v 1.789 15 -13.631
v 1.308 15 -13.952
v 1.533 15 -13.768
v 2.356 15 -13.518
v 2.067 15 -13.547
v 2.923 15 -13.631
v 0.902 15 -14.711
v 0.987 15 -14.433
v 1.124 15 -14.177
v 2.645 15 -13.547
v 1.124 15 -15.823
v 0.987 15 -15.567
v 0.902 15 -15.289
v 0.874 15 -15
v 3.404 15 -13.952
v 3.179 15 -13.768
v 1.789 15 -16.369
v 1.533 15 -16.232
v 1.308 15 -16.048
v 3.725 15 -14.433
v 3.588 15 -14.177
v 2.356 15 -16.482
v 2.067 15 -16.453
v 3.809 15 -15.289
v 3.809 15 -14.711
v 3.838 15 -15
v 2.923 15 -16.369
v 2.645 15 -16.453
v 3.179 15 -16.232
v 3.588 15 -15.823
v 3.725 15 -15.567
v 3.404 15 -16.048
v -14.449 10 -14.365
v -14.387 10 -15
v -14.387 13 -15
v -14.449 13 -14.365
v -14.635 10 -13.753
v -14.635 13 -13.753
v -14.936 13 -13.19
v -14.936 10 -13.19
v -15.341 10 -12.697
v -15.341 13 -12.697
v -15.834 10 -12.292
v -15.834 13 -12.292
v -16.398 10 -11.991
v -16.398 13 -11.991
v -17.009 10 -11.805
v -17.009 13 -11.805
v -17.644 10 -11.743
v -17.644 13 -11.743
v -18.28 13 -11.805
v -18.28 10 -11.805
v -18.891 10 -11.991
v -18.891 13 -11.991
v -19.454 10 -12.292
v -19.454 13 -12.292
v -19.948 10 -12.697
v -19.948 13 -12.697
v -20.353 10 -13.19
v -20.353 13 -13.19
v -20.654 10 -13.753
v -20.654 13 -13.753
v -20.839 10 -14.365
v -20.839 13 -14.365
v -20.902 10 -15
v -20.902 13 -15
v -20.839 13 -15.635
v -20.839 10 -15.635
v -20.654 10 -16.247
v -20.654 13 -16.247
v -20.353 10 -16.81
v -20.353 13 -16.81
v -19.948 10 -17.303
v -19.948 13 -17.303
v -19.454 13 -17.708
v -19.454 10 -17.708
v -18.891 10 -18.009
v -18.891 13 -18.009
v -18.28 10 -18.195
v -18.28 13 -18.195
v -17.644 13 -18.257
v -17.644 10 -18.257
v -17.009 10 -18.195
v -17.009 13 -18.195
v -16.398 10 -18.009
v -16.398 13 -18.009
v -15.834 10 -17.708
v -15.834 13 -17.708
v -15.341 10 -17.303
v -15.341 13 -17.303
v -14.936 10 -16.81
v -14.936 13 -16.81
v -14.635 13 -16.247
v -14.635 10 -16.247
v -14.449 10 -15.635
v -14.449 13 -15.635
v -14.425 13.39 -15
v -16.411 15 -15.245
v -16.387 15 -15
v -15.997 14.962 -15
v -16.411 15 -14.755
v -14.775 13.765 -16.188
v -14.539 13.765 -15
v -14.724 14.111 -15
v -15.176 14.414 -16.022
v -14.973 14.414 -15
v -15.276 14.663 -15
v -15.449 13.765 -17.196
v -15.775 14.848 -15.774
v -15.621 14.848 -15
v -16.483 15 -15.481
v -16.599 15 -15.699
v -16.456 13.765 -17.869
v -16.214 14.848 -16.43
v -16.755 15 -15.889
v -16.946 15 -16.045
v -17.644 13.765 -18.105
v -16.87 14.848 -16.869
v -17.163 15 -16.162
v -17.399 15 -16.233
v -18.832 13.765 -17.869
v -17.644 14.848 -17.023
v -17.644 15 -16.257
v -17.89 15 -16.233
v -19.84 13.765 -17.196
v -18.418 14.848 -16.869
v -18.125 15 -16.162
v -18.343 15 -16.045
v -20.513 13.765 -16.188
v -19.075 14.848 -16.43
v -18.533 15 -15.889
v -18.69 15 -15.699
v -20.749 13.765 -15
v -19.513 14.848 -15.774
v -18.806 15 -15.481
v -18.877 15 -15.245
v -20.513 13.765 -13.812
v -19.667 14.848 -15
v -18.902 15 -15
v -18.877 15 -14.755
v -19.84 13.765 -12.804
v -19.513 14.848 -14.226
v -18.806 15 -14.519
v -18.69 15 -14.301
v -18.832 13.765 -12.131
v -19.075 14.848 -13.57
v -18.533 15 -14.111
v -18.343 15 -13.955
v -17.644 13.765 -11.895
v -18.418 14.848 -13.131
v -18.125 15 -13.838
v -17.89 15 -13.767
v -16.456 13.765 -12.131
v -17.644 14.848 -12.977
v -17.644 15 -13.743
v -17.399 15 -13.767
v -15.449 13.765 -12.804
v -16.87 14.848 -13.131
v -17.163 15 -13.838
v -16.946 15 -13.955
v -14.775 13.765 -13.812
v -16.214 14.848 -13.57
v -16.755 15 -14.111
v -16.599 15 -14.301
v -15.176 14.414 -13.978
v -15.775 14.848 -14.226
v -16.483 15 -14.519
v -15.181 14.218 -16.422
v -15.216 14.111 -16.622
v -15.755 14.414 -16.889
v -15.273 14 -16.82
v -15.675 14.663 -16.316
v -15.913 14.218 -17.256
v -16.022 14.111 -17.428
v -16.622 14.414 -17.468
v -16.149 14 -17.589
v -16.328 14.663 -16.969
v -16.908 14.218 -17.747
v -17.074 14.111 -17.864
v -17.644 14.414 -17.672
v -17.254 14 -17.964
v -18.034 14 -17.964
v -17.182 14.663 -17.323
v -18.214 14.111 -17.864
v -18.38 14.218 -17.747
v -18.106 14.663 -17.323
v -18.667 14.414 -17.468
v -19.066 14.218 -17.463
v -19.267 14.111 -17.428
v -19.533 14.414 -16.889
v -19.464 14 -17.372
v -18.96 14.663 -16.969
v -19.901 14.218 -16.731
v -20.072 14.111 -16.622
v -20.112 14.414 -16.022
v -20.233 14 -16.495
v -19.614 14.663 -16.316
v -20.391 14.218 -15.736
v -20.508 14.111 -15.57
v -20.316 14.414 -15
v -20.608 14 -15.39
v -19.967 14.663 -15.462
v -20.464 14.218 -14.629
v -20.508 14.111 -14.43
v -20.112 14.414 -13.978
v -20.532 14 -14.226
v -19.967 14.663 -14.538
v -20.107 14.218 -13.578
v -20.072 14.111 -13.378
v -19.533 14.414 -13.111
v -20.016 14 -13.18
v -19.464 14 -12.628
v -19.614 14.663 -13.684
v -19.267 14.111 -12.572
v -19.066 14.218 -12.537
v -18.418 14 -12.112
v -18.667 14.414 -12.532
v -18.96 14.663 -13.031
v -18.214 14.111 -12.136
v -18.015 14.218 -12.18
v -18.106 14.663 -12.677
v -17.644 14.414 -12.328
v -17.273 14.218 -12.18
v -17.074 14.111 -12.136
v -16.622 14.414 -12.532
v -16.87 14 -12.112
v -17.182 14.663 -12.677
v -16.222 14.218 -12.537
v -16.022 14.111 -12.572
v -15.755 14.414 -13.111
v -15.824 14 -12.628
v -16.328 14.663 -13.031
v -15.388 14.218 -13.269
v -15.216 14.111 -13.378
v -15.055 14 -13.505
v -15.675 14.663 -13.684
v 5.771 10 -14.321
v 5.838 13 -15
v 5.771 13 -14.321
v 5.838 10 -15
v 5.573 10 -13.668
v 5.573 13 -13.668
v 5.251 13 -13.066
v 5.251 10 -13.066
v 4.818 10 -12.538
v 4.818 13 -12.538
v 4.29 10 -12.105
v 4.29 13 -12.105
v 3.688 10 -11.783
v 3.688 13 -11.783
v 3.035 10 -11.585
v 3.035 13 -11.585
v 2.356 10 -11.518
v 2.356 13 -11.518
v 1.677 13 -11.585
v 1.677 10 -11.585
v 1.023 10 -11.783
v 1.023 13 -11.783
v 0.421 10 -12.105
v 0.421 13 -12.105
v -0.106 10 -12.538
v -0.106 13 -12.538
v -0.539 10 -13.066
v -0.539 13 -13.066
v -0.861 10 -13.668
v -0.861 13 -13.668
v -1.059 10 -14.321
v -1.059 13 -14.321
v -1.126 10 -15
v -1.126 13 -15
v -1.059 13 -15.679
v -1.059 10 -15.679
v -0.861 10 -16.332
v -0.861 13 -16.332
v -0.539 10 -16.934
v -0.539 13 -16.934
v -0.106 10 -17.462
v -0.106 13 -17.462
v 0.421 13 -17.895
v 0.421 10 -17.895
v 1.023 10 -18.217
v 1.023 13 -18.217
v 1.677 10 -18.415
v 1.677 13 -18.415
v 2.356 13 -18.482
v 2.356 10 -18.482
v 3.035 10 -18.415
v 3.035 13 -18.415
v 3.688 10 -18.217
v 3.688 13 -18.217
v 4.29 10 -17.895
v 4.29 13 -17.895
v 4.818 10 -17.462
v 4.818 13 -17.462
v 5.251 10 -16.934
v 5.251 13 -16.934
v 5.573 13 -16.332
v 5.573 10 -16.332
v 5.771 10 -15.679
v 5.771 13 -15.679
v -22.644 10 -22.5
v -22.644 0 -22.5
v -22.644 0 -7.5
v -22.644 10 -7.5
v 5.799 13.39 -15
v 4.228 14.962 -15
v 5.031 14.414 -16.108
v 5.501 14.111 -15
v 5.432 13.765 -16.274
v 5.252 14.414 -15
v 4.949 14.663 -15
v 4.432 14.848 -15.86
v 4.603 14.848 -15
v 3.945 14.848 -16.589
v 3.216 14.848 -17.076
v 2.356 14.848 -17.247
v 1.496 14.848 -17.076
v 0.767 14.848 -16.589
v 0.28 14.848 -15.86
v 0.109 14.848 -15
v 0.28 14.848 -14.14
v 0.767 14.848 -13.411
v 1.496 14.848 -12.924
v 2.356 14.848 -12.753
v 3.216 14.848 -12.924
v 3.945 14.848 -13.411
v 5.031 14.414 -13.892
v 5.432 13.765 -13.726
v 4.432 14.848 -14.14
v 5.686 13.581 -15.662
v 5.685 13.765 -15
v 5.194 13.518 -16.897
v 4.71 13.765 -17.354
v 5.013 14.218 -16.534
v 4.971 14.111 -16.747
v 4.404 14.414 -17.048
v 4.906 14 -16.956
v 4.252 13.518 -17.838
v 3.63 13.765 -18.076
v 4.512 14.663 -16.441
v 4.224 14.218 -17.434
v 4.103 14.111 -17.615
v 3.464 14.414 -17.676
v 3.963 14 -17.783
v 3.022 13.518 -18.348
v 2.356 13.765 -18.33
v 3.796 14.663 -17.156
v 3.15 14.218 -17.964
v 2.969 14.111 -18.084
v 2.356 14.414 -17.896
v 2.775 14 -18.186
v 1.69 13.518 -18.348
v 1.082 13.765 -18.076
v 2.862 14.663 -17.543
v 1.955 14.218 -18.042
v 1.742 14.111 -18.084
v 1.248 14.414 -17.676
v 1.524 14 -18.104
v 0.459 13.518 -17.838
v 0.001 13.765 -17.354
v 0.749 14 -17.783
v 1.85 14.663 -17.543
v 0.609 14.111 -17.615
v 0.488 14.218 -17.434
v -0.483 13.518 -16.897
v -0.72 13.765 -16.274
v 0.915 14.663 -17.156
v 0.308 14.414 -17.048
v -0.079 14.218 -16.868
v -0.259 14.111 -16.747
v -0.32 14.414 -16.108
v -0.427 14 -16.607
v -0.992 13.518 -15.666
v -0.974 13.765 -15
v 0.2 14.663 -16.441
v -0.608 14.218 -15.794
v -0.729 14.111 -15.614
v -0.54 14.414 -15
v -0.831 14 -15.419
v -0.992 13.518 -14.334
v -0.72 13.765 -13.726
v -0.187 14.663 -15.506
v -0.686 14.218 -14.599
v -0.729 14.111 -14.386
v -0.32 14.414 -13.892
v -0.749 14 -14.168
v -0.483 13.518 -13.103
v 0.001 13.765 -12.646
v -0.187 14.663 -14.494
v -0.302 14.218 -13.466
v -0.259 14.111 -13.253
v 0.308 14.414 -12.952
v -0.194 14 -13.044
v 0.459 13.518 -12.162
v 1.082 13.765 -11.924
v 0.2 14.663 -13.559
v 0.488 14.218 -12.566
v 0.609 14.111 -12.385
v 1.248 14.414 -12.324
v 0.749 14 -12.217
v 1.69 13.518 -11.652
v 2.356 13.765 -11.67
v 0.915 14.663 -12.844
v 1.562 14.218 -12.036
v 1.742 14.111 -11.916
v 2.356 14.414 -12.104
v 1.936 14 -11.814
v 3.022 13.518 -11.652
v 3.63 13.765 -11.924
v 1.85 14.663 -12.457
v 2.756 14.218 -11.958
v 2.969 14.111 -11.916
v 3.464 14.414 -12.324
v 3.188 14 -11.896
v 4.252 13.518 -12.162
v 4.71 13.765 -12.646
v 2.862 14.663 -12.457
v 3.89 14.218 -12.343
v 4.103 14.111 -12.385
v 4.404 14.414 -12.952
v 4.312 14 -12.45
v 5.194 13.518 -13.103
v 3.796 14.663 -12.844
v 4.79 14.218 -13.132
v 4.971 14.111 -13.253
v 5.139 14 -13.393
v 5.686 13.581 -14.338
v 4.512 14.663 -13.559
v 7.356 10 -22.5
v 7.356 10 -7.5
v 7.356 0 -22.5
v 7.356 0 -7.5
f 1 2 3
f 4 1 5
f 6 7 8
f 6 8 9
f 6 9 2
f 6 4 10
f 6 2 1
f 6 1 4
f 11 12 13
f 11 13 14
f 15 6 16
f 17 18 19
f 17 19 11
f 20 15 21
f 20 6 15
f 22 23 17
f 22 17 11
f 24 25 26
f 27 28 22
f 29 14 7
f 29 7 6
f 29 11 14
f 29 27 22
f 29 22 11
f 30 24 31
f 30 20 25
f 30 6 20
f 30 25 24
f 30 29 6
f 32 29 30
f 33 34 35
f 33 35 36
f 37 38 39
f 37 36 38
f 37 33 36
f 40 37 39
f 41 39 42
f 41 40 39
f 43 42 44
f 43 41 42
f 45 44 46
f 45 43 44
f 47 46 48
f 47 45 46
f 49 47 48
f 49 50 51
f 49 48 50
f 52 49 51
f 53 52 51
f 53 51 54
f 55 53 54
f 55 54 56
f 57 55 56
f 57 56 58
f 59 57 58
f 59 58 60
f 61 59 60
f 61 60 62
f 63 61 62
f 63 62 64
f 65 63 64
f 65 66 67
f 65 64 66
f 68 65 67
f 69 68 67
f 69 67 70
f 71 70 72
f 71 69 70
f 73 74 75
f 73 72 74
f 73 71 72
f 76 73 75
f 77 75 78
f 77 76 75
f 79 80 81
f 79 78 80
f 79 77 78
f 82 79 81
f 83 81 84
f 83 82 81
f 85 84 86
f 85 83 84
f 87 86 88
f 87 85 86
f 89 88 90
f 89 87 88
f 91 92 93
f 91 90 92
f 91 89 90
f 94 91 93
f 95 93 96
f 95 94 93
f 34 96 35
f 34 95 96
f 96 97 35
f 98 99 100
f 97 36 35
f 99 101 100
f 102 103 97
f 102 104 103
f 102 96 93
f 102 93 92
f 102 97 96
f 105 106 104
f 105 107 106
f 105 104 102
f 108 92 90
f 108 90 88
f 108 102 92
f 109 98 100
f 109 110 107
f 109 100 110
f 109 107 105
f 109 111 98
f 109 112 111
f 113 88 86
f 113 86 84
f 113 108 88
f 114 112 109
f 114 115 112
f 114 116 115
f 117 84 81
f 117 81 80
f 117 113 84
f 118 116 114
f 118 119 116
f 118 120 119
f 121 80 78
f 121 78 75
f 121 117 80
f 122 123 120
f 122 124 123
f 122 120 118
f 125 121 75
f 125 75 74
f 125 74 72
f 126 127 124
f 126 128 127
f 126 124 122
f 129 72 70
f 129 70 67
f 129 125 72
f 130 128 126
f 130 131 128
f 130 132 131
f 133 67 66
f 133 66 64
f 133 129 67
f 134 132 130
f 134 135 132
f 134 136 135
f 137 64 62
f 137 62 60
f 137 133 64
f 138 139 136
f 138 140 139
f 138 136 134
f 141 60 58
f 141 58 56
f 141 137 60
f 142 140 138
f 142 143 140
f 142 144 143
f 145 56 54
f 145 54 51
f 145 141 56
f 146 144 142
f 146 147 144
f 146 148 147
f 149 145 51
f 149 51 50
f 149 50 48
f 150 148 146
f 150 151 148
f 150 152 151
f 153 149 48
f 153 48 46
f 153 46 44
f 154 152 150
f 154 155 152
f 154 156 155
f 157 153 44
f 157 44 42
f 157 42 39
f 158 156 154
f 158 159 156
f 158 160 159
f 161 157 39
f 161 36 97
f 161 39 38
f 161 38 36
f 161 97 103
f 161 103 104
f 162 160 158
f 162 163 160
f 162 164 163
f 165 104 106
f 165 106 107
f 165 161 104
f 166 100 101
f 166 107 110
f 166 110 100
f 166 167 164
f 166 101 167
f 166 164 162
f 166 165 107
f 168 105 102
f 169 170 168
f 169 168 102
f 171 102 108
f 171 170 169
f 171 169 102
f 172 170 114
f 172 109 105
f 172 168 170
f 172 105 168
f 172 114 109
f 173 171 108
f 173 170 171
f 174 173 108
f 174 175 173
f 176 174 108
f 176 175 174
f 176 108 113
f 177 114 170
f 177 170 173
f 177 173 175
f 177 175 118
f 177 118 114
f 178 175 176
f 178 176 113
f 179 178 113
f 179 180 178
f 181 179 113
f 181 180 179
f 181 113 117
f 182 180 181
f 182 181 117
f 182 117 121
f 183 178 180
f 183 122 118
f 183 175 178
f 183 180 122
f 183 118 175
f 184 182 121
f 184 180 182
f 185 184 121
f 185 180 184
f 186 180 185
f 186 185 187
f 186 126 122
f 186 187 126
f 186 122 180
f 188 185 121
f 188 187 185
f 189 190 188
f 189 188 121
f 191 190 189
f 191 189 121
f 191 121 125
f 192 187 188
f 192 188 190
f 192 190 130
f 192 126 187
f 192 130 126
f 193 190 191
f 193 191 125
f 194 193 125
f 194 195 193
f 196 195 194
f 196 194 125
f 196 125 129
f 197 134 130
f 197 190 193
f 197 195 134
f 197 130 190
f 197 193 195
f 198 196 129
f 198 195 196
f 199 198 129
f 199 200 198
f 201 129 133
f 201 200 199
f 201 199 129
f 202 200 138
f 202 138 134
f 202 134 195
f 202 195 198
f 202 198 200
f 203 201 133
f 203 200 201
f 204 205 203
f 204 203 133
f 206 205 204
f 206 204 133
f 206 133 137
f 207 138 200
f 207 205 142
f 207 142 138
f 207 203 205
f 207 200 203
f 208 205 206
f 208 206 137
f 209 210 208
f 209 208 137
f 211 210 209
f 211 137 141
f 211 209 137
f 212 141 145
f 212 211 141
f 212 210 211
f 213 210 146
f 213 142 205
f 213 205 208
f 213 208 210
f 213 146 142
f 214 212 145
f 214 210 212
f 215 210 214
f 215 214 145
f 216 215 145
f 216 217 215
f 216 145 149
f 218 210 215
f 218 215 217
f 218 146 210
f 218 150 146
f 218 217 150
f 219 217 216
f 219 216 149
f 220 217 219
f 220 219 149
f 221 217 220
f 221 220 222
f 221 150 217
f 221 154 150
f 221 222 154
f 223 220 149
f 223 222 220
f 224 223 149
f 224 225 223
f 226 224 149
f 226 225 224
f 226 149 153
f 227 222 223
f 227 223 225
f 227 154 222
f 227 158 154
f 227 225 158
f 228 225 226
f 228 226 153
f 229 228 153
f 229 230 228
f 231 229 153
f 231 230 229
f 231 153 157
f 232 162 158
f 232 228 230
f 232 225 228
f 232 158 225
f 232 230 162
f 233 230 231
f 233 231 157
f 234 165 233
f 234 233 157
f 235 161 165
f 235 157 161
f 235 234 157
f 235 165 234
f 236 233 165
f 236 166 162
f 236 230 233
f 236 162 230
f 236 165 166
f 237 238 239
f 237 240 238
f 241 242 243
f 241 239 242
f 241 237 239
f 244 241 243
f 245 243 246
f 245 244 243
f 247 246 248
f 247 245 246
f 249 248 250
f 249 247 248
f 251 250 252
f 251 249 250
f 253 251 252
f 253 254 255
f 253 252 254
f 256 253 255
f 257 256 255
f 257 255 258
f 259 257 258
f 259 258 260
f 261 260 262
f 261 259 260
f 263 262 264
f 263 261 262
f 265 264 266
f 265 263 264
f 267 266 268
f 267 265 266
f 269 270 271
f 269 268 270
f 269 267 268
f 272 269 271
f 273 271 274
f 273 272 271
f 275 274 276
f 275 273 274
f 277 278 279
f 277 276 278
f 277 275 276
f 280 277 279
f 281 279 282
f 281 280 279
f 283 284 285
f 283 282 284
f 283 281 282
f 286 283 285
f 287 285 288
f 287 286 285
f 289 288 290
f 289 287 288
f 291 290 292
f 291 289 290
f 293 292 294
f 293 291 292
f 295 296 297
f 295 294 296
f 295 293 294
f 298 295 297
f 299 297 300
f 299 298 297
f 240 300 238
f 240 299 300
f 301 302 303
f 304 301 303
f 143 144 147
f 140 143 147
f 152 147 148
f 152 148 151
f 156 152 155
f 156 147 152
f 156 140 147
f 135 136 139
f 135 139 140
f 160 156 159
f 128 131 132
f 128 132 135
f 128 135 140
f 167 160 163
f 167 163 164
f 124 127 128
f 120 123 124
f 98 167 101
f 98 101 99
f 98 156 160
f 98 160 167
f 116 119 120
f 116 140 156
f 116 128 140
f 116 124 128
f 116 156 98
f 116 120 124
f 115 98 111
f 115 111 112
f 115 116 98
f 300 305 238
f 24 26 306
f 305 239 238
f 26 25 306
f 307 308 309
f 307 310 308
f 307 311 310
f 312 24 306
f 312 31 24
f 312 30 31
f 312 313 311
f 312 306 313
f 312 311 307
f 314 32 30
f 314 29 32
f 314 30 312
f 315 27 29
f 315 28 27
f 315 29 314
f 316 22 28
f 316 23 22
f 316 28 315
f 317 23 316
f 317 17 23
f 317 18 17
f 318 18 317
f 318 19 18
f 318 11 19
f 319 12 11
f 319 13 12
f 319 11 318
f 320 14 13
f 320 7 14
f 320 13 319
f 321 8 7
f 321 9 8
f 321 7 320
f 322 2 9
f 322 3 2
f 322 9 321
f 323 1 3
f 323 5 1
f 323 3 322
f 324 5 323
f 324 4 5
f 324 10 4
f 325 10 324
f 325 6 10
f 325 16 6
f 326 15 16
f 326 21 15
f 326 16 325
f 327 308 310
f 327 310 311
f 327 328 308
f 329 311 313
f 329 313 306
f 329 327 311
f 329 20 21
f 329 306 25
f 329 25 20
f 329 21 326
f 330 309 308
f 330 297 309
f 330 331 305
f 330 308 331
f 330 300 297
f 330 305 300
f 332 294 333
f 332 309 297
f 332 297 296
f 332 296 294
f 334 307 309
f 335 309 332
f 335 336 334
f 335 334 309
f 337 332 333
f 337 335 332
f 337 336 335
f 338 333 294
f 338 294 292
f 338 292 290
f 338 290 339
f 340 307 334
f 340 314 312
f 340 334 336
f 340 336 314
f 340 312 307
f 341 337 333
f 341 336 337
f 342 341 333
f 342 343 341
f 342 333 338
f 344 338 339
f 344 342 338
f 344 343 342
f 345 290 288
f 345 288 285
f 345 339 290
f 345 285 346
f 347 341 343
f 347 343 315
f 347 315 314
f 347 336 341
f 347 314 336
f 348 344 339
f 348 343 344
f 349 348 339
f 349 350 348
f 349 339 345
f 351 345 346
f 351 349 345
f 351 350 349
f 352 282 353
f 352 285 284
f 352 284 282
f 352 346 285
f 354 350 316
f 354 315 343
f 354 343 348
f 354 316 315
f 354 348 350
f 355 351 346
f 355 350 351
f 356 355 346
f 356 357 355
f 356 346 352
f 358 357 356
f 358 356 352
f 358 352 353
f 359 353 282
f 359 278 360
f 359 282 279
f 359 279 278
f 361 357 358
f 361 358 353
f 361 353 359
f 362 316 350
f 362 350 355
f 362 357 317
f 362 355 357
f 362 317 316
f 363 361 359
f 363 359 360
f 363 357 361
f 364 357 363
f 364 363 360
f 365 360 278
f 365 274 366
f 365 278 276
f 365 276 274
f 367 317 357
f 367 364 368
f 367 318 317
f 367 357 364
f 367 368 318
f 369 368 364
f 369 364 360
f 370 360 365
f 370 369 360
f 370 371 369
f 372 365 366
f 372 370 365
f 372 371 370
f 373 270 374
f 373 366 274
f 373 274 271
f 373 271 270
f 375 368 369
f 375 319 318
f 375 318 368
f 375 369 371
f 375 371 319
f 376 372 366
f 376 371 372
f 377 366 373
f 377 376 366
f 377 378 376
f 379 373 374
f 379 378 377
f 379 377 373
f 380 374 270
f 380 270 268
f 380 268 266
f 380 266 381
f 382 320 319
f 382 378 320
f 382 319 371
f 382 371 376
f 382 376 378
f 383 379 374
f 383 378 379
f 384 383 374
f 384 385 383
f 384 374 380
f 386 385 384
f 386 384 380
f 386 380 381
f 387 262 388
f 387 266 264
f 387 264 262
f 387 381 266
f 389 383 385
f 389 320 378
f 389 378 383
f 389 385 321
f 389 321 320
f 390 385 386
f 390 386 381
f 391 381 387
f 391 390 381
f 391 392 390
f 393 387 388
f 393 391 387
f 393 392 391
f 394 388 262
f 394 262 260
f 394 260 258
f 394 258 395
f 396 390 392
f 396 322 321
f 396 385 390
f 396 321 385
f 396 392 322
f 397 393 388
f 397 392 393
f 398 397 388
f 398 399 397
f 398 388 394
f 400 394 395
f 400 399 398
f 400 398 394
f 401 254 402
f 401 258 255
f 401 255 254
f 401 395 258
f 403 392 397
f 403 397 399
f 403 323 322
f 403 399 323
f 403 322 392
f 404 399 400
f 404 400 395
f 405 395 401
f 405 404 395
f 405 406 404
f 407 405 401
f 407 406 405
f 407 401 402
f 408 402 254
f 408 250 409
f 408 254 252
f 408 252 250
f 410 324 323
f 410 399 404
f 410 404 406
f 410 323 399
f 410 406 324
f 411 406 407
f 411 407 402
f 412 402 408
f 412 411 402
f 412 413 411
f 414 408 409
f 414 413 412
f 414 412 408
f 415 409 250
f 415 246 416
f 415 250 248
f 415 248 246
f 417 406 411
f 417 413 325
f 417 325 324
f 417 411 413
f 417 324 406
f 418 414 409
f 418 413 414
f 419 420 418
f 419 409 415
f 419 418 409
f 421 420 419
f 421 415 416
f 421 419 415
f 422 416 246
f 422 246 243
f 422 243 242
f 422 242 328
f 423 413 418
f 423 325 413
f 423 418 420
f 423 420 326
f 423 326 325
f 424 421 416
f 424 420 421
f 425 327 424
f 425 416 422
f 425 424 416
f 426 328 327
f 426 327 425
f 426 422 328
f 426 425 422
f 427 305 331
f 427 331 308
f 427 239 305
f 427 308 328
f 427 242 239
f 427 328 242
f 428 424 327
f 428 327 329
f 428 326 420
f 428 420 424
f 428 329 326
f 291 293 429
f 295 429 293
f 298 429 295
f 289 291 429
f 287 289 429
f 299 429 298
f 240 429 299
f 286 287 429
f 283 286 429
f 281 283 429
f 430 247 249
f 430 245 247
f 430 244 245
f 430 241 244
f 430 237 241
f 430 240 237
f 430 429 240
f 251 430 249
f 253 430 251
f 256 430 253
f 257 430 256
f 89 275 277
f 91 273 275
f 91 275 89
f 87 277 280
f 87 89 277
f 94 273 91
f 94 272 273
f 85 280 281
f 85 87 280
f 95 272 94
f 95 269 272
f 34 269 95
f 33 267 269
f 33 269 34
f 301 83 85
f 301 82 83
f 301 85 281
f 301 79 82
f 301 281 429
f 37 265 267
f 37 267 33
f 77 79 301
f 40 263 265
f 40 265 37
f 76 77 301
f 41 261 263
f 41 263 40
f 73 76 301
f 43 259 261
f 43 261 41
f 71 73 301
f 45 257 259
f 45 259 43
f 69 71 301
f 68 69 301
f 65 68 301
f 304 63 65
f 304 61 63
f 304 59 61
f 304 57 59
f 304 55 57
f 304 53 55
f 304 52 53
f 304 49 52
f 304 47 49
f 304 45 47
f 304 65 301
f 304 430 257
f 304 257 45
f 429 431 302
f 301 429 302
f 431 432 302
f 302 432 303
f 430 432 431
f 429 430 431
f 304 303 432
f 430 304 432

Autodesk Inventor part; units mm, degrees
ref_plane "YZ Plane" through (0, 0, 0) normal (1, 0, 0) x (0, 1, 0)
ref_plane "XZ Plane" through (0, 0, 0) normal (0, 1, 0) x (-1, 0, 0)
ref_plane "XY Plane" through (0, 0, 0) normal (0, 0, 1) x (1, 0, 0)
sketch "Skizze1" plane through (0, 0, 0) normal (0, 1, 0) x (-1, 0, 0)
  line L0 (22.6442, -7.5) -> (-7.3558, -7.5)
  line L1 (-7.3558, -7.5) -> (-7.3558, -22.5)
  line L2 (-7.3558, -22.5) -> (22.6442, -22.5)
  line L3 (22.6442, -22.5) -> (22.6442, -7.5)
  point P0 (0, 0)
  dimension "d0" = 15
  dimension "d1" = 30
extrude "Extrusion1" add sketch "Skizze1" along normal blind 10
sketch "Skizze2" plane through (0, 10, 0) normal (0, 1, 0) x (1, 0, 0)
  circle A0 centre (-17.6442, 15) radius 3.2574
  circle A1 centre (2.3558, 15) radius 3.4818
  line L0 (-22.6442, 22.5) -> (-22.6442, 7.5) projected
  line L1 (7.3558, 7.5) -> (7.3558, 22.5) projected
  line L2 (7.3558, 22.5) -> (-22.6442, 22.5) projected
  point P0 (0, 0)
  dimension "d4" = 5
  dimension "d5" = 5
  dimension "d6" = 7.5
  dimension "d7" = 7.5
extrude "Extrusion2" add sketch "Skizze2" along normal blind 5
fillet "Rundung1" radius 2 2 edges at (-20.9017, 15, -15) (-1.1261, 15, -15)
properties part number "IR-Sensor"
